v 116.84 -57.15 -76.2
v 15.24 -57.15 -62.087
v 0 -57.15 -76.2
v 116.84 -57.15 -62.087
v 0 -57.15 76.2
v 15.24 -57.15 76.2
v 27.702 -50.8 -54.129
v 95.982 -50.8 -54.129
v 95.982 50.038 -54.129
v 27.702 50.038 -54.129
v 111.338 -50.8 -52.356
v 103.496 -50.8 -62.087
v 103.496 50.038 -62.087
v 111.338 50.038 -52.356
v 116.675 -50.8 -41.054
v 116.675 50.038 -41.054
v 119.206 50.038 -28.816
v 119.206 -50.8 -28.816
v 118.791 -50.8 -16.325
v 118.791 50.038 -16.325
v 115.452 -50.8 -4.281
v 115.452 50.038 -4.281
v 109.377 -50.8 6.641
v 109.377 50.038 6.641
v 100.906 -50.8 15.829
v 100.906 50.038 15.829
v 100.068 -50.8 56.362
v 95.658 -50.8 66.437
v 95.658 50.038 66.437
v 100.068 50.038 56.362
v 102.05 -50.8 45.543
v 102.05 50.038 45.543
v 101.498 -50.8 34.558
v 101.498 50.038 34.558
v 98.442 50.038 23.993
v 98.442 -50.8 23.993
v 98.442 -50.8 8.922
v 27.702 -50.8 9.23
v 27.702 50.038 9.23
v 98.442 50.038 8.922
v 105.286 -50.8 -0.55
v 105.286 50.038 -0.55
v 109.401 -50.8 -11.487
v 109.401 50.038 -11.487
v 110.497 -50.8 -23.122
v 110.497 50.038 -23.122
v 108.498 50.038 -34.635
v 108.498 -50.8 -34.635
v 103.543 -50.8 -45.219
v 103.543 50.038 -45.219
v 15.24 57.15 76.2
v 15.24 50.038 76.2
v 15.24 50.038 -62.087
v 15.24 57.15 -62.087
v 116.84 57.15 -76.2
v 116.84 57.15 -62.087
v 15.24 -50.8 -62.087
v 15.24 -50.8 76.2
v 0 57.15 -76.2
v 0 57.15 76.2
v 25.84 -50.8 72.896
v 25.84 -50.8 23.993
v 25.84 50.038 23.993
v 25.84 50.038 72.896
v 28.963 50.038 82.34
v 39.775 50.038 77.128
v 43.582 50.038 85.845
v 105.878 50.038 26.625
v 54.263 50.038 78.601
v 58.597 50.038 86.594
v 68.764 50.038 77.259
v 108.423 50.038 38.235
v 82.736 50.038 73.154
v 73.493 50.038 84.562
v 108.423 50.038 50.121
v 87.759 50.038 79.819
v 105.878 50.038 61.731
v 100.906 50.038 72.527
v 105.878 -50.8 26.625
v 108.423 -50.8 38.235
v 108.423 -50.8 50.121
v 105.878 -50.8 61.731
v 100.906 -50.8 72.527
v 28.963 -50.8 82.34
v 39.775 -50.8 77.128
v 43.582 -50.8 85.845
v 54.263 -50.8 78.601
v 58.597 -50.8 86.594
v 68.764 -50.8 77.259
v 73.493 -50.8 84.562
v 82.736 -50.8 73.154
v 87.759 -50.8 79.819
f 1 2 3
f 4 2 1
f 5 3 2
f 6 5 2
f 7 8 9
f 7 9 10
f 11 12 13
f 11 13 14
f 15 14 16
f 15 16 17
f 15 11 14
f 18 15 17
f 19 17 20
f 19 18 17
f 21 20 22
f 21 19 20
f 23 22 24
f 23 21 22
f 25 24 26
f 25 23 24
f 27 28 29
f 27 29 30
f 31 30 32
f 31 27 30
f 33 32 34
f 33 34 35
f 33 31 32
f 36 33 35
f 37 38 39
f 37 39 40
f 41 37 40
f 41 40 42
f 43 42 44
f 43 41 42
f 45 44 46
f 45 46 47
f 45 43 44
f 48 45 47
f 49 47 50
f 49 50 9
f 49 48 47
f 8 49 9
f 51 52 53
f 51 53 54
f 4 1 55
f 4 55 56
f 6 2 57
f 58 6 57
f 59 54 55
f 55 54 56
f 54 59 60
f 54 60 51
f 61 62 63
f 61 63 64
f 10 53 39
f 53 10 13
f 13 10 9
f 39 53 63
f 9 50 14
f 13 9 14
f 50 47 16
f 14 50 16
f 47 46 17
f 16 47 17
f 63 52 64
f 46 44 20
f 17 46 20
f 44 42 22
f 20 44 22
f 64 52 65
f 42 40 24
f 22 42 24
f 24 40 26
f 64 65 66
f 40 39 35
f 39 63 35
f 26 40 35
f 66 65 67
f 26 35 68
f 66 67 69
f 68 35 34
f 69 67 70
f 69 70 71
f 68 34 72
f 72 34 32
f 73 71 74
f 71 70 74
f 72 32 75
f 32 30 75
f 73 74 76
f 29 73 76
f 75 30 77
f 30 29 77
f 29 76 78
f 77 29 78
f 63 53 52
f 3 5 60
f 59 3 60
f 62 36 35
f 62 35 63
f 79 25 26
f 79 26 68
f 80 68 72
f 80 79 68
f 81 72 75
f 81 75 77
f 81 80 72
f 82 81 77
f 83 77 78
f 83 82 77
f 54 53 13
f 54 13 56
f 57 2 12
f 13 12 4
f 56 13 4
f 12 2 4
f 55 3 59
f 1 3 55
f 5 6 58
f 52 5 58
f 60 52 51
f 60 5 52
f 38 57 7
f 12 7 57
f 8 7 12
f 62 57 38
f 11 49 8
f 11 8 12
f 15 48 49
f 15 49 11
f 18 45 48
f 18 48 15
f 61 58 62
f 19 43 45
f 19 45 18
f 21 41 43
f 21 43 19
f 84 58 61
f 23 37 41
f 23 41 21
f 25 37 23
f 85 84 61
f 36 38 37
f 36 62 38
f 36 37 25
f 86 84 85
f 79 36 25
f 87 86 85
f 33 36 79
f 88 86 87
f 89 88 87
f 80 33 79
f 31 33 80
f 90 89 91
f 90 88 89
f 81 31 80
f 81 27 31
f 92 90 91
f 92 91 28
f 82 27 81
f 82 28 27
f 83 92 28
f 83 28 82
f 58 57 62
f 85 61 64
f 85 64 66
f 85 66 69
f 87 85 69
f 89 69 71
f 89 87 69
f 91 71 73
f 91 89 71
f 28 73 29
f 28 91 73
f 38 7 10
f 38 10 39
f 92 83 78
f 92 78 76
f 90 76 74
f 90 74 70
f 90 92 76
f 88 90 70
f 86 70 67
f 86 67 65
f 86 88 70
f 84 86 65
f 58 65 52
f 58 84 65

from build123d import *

# Parameters (mm, degrees)
F0_W     = 114.3
F0_H     = 152.4
F1_DEPTH = 15.24
F2_W     = 101.6
F2_H     = 14.1132464528
F3_DEPTH = 57.15
F4_DEPTH = 57.15
F6_DEPTH = 50.8
F7_DEPTH = 100.838


with BuildPart() as f1:
    # F0 (on Right) → F1 (new body)
    with BuildSketch(Plane.YZ):
        Rectangle(F0_W, F0_H)
    extrude(amount=F1_DEPTH)

    # F2 (on Front) → F3 (join)
    with BuildSketch(Plane.XZ):
        with Locations((66.04, -69.1433767736)):
            Rectangle(F2_W, F2_H)
    extrude(amount=F3_DEPTH)

    # F2 (on Front) → F4 (join)
    with BuildSketch(Plane.XZ):
        with Locations((66.04, -69.1433767736)):
            Rectangle(F2_W, F2_H)
    extrude(amount=-F4_DEPTH)

    # F5 (on Front) → F6 (join)
    with BuildSketch(Plane.XZ):
        with BuildLine():
            ThreePointArc((100.9056121111, 15.8293191344), (108.7441404523, 44.1781850532), (100.9056121111, 72.527050972))
            ThreePointArc((100.9056121111, 72.527050972), (58.597203119, 86.5942412093), (15.24, 76.2))
            Line((15.24, 76.2), (15.24, -62.0867535472))
            Line((15.24, -62.0867535472), (103.4958660603, -62.0867535472))
            ThreePointArc((103.4958660603, -62.0867535472), (119.3690519034, -22.5579711646), (100.9056121111, 15.8293191344))
        make_face()
        with BuildLine():
            Line((27.7020576755, -54.1285201907), (27.7020576755, 9.2299426906))
            Line((27.7020576755, 9.2299426906), (98.4420868913, 8.9223771356))
            ThreePointArc((98.4420868913, 8.9223771356), (110.4971458699, -23.121521712), (95.9815699021, -54.1285201907))
            Line((95.9815699021, -54.1285201907), (27.7020576755, -54.1285201907))
        make_face(mode=Mode.SUBTRACT)
        with BuildLine():
            ThreePointArc((95.6577137113, 66.4370954037), (102.0499654522, 45.5430957208), (98.4420868913, 23.9930767566))
            Line((98.4420868913, 23.9930767566), (25.8403848857, 23.9930767566))
            Line((25.8403848857, 23.9930767566), (25.8403848857, 72.8959664702))
            ThreePointArc((25.8403848857, 72.8959664702), (61.5459883334, 78.2810634281), (95.6577137113, 66.4370954037))
        make_face(mode=Mode.SUBTRACT)
    extrude(amount=F6_DEPTH)

    # F7 (add): a face of the model
    f7_faces = [f1.faces().sort_by_distance(p)[0] for p in [
        (106.9281796112, -50.8, 44.1781850532),
    ]]
    extrude(f7_faces, amount=-F7_DEPTH)


solid = f1.part
